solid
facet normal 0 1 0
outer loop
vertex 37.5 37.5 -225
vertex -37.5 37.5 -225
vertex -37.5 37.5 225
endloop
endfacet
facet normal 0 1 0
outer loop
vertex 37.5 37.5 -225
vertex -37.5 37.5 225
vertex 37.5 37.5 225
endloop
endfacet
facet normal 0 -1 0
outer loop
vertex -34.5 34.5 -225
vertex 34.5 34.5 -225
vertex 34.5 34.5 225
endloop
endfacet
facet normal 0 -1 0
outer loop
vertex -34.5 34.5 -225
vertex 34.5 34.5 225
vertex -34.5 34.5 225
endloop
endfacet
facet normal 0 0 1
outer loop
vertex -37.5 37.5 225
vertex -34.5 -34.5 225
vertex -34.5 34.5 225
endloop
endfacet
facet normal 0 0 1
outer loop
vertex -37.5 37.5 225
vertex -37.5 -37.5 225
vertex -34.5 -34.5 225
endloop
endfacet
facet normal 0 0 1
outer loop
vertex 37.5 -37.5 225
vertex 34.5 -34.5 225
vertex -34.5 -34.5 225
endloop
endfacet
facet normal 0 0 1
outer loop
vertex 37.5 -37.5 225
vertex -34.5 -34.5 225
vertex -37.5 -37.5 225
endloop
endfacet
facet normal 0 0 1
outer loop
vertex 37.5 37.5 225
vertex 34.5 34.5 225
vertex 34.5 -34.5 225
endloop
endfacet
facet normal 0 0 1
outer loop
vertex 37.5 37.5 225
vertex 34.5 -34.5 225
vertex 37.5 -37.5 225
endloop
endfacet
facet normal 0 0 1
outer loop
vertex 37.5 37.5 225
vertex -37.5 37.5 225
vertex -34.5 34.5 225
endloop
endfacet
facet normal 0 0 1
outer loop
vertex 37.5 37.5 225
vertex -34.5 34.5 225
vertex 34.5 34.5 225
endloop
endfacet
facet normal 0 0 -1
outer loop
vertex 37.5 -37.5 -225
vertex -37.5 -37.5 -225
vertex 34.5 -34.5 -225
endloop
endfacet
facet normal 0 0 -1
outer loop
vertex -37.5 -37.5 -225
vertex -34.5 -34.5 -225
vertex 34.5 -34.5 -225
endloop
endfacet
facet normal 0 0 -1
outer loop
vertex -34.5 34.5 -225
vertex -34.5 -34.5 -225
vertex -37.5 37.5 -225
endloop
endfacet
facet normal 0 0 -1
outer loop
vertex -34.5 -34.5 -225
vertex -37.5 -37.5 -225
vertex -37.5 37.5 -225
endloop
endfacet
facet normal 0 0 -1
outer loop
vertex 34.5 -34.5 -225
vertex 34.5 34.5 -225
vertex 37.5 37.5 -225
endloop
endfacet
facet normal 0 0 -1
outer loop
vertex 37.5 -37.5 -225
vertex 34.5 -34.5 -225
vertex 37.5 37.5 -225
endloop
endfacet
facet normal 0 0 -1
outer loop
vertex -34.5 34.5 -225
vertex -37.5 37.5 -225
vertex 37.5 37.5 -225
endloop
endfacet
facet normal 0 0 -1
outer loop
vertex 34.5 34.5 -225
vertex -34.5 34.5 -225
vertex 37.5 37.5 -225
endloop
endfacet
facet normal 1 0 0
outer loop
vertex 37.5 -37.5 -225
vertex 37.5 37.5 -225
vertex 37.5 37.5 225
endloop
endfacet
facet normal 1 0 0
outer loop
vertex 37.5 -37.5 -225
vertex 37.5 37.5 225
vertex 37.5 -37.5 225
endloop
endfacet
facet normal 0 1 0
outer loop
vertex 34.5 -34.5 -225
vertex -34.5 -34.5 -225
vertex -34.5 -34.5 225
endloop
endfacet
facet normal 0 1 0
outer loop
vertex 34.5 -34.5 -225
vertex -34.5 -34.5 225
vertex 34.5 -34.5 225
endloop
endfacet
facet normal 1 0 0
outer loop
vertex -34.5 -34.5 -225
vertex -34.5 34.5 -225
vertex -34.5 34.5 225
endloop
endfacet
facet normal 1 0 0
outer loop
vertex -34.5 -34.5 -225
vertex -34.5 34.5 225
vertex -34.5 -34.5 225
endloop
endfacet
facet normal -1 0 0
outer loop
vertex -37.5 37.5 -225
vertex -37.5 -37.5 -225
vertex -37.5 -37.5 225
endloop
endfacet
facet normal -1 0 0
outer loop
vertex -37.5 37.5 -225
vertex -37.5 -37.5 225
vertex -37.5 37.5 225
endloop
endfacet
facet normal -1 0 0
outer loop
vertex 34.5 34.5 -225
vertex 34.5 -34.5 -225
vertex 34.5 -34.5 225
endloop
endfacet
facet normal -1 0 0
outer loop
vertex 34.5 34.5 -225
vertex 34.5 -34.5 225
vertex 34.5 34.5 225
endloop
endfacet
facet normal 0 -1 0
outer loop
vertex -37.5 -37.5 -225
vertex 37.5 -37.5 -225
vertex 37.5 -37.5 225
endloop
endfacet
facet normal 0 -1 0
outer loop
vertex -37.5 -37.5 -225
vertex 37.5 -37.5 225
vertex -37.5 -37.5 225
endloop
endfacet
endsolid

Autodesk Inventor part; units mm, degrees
ref_plane "YZ Plane" through (0, 0, 0) normal (1, 0, 0) x (0, 1, 0)
ref_plane "XZ Plane" through (0, 0, 0) normal (0, 1, 0) x (-1, 0, 0)
ref_plane "XY Plane" through (0, 0, 0) normal (0, 0, 1) x (1, 0, 0)
sketch "Boceto1" plane through (0, 0, 0) normal (0, 0, 1) x (1, 0, 0)
  line L0 (-37.5, 37.5) -> (37.5, 37.5)
  line L1 (37.5, 37.5) -> (37.5, -37.5)
  line L2 (37.5, -37.5) -> (-37.5, -37.5)
  line L3 (-37.5, -37.5) -> (-37.5, 37.5)
  line L4 (34.5, 34.5) -> (-34.5, 34.5)
  line L5 (-34.5, 34.5) -> (-34.5, -34.5)
  line L6 (-34.5, -34.5) -> (34.5, -34.5)
  line L7 (34.5, -34.5) -> (34.5, 34.5)
  point P0 (0, 0)
  dimension "d0" = 75
  dimension "d1" = 75
  dimension "d2" = 3
  dimension "d3" = 37.5
  dimension "d4" = 37.5
extrude "Extrusión1" add sketch "Boceto1" along normal mid plane 450
equation "\"d0\" = width"
equation "\"d1\" = height"
equation "\"d2\" = t"
equation "\"d3\" = 0.5 * height"
equation "\"d4\" = 0.5 * width"
equation "\"d5\" = length"
equation "\"width\" = 75"
equation "\"height\" = 75"
equation "\"t\" = 3"
equation "\"length\" = 450"
properties part number "45 STEEL PROFILE" material "Acero"
